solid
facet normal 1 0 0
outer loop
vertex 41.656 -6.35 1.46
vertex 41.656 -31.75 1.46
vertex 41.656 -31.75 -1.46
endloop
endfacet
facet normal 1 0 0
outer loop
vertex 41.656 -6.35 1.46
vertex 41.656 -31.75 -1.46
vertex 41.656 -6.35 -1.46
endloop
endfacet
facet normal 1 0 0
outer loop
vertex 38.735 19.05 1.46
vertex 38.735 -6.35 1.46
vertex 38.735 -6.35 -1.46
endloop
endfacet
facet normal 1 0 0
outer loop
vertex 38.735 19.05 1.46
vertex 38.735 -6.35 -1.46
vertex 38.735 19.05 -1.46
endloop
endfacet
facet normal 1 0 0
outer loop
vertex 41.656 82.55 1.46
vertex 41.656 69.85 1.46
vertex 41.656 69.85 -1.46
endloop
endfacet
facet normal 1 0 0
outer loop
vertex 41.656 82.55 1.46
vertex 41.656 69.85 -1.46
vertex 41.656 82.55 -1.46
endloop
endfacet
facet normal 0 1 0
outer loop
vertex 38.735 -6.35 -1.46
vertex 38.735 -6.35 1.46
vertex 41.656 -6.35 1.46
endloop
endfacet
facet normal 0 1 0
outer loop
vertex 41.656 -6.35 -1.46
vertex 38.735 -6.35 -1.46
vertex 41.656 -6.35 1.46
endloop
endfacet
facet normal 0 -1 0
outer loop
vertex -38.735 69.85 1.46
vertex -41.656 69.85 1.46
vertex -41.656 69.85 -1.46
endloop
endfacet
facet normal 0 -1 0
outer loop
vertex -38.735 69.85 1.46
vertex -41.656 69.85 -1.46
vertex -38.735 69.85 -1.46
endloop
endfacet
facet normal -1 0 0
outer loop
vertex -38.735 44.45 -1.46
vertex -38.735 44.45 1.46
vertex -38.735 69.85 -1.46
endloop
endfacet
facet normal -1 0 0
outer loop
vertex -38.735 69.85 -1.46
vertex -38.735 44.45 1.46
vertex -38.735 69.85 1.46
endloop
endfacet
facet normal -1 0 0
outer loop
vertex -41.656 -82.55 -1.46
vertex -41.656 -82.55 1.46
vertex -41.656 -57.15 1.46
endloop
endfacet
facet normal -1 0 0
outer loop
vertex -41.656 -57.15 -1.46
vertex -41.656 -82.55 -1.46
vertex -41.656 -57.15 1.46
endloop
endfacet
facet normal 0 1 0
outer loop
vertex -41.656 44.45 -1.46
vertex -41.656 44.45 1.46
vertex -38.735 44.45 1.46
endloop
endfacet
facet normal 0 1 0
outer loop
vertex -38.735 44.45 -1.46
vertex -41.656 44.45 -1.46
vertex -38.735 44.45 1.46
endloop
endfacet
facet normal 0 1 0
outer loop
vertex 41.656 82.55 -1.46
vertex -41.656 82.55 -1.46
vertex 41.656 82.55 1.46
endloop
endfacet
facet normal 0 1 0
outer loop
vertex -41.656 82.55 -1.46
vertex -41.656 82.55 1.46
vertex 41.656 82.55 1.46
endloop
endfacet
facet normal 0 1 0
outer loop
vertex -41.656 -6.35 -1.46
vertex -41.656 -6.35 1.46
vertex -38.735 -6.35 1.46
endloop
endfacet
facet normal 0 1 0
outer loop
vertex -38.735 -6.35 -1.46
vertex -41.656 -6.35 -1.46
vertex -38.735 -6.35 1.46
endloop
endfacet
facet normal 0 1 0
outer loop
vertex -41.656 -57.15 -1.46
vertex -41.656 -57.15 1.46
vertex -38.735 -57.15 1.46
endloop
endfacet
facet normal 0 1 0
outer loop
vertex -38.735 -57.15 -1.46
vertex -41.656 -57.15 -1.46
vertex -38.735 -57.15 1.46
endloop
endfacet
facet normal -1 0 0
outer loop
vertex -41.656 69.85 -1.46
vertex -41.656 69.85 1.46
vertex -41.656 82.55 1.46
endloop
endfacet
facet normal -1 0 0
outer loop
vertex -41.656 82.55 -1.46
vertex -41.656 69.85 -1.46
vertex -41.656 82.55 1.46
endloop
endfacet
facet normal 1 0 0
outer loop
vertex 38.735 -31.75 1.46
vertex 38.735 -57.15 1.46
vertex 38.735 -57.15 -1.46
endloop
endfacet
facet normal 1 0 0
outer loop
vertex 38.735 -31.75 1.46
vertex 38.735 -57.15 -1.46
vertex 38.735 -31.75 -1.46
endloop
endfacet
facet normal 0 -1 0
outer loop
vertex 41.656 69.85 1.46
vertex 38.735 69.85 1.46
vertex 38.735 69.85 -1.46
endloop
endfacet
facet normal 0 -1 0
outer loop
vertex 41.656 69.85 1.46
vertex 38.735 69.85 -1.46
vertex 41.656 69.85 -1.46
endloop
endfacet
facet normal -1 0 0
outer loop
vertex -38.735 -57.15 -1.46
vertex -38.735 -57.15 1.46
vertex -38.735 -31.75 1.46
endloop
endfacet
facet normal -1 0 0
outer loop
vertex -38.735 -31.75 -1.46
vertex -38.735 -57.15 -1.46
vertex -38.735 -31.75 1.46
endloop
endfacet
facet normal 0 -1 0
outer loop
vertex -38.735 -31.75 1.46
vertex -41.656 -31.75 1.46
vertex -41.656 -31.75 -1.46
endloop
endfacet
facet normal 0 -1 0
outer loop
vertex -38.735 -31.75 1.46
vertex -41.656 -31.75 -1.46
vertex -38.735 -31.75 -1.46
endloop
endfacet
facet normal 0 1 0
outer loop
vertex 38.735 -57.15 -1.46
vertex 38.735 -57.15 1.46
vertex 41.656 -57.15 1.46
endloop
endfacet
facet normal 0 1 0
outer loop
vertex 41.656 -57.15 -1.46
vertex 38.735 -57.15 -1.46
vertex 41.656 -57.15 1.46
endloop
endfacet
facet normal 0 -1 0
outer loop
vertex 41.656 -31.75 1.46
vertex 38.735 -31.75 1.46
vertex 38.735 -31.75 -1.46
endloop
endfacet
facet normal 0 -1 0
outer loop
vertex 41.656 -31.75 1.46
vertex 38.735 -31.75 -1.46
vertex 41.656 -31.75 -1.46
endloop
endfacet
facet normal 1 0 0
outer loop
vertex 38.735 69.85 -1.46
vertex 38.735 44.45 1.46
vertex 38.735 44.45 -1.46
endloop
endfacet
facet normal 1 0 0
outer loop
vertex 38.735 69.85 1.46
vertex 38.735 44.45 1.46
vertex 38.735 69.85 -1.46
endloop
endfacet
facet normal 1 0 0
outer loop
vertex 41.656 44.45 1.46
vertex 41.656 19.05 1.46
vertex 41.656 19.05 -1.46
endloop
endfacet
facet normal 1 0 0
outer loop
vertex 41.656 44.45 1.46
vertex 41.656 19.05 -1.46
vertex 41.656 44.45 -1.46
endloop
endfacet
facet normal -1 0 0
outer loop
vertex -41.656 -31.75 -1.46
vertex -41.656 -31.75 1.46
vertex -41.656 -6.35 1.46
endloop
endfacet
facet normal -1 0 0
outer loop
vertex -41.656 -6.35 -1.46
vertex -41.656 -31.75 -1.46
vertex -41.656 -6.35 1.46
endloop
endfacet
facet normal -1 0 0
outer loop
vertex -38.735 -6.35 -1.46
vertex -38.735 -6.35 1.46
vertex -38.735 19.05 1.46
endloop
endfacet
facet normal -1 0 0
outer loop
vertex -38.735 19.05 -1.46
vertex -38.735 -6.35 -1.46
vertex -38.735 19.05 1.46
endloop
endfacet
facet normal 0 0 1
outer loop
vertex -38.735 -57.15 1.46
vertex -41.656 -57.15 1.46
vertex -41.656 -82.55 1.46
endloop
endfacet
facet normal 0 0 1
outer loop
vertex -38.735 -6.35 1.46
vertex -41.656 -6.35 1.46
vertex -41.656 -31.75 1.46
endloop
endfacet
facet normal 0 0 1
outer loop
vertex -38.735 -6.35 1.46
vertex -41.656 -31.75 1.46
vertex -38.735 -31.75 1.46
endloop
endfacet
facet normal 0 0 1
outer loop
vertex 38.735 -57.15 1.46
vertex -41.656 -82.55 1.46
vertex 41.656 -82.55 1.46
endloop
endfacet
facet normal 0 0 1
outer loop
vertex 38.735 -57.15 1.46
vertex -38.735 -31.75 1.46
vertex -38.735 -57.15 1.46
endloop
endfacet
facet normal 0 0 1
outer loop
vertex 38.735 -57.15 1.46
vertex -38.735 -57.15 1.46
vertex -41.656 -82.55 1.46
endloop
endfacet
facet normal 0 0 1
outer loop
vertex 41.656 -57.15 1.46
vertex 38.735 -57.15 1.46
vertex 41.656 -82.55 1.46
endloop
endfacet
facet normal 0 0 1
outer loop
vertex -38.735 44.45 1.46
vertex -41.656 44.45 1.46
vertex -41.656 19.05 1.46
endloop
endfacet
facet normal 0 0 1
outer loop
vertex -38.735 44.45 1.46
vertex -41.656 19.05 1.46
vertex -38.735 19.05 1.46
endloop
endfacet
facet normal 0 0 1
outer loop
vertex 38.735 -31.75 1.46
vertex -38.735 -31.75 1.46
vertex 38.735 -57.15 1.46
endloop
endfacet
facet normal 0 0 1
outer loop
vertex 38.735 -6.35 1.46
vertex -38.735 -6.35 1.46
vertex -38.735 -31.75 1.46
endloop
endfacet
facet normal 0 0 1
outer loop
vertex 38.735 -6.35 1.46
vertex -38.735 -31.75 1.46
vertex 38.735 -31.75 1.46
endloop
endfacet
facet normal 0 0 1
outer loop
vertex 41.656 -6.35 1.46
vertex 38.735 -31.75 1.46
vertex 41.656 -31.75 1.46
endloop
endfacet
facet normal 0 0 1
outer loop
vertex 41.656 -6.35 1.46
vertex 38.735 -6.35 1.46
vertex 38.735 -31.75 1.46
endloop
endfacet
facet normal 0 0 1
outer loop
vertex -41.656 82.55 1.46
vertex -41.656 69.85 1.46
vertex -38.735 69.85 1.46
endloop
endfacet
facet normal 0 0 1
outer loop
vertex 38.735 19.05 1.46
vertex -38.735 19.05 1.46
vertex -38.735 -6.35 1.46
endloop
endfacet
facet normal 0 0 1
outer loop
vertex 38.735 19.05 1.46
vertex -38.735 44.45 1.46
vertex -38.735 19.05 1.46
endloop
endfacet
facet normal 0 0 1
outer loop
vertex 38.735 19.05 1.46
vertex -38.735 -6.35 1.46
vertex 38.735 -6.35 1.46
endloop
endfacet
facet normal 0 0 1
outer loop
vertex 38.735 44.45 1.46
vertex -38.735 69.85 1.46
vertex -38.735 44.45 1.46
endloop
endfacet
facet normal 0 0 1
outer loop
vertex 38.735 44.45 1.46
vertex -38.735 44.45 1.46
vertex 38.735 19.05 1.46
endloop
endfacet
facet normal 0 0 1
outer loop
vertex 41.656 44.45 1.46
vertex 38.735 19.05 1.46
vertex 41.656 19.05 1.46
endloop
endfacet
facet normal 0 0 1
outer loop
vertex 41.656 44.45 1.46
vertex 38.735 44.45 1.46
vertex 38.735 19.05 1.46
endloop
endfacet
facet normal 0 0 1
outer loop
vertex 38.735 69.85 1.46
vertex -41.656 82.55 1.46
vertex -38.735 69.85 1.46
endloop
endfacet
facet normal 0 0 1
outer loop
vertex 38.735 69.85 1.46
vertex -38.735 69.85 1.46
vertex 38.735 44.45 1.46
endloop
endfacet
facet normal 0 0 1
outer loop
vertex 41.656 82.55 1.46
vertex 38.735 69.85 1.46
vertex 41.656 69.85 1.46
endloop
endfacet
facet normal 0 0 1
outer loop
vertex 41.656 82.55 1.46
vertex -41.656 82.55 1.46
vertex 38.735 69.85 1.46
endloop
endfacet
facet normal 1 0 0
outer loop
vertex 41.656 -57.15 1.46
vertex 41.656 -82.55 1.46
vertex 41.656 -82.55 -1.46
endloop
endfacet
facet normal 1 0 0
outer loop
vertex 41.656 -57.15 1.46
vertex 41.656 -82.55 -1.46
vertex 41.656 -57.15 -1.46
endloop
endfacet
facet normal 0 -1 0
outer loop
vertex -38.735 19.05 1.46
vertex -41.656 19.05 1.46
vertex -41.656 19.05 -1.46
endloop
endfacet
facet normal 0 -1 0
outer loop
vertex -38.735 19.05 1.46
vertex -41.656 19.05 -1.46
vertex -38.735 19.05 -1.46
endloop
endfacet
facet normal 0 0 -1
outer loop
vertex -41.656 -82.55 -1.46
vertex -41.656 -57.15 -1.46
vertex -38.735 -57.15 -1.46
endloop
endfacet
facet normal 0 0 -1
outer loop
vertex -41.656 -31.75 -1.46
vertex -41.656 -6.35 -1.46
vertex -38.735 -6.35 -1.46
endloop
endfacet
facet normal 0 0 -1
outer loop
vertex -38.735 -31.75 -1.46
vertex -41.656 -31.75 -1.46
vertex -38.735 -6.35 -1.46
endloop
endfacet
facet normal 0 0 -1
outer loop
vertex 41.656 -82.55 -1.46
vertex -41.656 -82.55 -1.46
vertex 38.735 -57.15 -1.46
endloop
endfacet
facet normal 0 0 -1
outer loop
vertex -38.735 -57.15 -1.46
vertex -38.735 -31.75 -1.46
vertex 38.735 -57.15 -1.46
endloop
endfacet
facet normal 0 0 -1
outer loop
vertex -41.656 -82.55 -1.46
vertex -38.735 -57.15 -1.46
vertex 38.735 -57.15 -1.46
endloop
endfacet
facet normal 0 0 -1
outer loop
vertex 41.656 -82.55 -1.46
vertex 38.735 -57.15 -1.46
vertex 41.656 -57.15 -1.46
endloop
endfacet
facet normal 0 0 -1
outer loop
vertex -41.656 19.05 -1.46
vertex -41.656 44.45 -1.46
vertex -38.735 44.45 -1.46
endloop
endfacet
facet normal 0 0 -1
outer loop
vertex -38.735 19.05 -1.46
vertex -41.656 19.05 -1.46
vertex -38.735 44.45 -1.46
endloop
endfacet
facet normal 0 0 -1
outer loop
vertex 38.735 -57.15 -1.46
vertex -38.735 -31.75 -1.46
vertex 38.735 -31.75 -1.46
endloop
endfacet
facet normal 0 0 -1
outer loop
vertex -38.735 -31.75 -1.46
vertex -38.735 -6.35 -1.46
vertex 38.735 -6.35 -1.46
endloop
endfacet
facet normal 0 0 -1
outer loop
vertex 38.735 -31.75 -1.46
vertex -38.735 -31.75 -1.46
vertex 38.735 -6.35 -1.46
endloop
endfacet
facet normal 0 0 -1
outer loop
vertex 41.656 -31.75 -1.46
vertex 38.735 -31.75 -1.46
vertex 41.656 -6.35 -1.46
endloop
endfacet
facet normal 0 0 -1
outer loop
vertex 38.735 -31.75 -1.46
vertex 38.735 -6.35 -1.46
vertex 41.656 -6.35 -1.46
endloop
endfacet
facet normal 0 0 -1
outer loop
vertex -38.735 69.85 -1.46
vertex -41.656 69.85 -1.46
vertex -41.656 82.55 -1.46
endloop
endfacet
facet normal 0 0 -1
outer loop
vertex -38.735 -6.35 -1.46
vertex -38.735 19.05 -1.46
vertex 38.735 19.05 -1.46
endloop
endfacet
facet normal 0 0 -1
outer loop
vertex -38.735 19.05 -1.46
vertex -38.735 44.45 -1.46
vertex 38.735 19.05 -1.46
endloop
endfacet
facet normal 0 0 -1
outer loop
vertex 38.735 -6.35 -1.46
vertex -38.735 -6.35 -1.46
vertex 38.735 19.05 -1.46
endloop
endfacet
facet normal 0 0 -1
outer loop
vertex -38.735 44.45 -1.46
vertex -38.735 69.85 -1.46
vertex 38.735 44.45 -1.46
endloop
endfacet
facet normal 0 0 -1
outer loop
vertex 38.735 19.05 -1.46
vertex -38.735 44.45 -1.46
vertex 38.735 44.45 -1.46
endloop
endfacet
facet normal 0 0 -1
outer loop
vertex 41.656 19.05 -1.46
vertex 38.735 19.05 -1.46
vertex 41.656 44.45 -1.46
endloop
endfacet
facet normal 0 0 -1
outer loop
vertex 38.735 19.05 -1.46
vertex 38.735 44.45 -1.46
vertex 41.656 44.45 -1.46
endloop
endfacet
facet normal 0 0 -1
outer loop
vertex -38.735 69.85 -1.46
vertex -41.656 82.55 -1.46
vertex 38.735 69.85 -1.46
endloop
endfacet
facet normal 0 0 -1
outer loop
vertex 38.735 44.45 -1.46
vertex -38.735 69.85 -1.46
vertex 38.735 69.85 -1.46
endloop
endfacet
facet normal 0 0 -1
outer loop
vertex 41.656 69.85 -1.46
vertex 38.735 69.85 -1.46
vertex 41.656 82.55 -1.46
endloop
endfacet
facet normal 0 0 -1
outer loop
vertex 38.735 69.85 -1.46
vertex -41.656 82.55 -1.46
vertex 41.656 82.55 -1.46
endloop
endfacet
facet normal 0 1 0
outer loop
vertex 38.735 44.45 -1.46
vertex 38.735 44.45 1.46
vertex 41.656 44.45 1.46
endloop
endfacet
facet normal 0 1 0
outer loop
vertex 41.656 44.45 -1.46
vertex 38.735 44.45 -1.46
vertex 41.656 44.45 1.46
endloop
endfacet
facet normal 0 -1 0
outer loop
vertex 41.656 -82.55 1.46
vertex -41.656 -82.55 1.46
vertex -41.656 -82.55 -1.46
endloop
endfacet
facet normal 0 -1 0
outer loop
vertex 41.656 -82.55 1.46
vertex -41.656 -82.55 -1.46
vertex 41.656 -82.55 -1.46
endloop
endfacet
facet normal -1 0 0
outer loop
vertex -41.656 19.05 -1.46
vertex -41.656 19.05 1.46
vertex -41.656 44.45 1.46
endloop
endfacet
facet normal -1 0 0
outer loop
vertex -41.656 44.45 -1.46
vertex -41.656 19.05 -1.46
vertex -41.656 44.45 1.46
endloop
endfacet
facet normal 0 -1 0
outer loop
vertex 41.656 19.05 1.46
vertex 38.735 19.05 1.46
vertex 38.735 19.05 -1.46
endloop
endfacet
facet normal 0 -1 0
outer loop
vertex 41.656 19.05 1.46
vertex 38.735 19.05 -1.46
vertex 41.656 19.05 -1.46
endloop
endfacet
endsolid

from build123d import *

# Parameters (mm, degrees)
SKETCH1_W           = 83.312
SKETCH1_H           = 165.1
BOSS_EXTRUDE1_DEPTH = 1.4605
SKETCH2_W           = 2.921
SKETCH2_H           = 25.4
CUT_EXTRUDE1_DEPTH  = 2.921


with BuildPart() as part:
    # Sketch1 → Boss-Extrude1 (new, symmetric)
    with BuildSketch(Plane.XY):
        Rectangle(SKETCH1_W, SKETCH1_H)
    extrude(amount=BOSS_EXTRUDE1_DEPTH, both=True)

    # Sketch2 → Cut-Extrude1 (cut)
    with BuildSketch(Plane.XY.offset(1.4605)):
        with Locations((-40.1955, 57.15)):
            Rectangle(SKETCH2_W, SKETCH2_H)
        with Locations((-40.1955, 6.35)):
            Rectangle(SKETCH2_W, SKETCH2_H)
        with Locations((-40.1955, -44.45)):
            Rectangle(SKETCH2_W, SKETCH2_H)
        with Locations((40.1955, -44.45)):
            Rectangle(SKETCH2_W, SKETCH2_H)
        with Locations((40.1955, 6.35)):
            Rectangle(SKETCH2_W, SKETCH2_H)
        with Locations((40.1955, 57.15)):
            Rectangle(SKETCH2_W, SKETCH2_H)
    extrude(amount=-CUT_EXTRUDE1_DEPTH, mode=Mode.SUBTRACT)


solid = part.part
